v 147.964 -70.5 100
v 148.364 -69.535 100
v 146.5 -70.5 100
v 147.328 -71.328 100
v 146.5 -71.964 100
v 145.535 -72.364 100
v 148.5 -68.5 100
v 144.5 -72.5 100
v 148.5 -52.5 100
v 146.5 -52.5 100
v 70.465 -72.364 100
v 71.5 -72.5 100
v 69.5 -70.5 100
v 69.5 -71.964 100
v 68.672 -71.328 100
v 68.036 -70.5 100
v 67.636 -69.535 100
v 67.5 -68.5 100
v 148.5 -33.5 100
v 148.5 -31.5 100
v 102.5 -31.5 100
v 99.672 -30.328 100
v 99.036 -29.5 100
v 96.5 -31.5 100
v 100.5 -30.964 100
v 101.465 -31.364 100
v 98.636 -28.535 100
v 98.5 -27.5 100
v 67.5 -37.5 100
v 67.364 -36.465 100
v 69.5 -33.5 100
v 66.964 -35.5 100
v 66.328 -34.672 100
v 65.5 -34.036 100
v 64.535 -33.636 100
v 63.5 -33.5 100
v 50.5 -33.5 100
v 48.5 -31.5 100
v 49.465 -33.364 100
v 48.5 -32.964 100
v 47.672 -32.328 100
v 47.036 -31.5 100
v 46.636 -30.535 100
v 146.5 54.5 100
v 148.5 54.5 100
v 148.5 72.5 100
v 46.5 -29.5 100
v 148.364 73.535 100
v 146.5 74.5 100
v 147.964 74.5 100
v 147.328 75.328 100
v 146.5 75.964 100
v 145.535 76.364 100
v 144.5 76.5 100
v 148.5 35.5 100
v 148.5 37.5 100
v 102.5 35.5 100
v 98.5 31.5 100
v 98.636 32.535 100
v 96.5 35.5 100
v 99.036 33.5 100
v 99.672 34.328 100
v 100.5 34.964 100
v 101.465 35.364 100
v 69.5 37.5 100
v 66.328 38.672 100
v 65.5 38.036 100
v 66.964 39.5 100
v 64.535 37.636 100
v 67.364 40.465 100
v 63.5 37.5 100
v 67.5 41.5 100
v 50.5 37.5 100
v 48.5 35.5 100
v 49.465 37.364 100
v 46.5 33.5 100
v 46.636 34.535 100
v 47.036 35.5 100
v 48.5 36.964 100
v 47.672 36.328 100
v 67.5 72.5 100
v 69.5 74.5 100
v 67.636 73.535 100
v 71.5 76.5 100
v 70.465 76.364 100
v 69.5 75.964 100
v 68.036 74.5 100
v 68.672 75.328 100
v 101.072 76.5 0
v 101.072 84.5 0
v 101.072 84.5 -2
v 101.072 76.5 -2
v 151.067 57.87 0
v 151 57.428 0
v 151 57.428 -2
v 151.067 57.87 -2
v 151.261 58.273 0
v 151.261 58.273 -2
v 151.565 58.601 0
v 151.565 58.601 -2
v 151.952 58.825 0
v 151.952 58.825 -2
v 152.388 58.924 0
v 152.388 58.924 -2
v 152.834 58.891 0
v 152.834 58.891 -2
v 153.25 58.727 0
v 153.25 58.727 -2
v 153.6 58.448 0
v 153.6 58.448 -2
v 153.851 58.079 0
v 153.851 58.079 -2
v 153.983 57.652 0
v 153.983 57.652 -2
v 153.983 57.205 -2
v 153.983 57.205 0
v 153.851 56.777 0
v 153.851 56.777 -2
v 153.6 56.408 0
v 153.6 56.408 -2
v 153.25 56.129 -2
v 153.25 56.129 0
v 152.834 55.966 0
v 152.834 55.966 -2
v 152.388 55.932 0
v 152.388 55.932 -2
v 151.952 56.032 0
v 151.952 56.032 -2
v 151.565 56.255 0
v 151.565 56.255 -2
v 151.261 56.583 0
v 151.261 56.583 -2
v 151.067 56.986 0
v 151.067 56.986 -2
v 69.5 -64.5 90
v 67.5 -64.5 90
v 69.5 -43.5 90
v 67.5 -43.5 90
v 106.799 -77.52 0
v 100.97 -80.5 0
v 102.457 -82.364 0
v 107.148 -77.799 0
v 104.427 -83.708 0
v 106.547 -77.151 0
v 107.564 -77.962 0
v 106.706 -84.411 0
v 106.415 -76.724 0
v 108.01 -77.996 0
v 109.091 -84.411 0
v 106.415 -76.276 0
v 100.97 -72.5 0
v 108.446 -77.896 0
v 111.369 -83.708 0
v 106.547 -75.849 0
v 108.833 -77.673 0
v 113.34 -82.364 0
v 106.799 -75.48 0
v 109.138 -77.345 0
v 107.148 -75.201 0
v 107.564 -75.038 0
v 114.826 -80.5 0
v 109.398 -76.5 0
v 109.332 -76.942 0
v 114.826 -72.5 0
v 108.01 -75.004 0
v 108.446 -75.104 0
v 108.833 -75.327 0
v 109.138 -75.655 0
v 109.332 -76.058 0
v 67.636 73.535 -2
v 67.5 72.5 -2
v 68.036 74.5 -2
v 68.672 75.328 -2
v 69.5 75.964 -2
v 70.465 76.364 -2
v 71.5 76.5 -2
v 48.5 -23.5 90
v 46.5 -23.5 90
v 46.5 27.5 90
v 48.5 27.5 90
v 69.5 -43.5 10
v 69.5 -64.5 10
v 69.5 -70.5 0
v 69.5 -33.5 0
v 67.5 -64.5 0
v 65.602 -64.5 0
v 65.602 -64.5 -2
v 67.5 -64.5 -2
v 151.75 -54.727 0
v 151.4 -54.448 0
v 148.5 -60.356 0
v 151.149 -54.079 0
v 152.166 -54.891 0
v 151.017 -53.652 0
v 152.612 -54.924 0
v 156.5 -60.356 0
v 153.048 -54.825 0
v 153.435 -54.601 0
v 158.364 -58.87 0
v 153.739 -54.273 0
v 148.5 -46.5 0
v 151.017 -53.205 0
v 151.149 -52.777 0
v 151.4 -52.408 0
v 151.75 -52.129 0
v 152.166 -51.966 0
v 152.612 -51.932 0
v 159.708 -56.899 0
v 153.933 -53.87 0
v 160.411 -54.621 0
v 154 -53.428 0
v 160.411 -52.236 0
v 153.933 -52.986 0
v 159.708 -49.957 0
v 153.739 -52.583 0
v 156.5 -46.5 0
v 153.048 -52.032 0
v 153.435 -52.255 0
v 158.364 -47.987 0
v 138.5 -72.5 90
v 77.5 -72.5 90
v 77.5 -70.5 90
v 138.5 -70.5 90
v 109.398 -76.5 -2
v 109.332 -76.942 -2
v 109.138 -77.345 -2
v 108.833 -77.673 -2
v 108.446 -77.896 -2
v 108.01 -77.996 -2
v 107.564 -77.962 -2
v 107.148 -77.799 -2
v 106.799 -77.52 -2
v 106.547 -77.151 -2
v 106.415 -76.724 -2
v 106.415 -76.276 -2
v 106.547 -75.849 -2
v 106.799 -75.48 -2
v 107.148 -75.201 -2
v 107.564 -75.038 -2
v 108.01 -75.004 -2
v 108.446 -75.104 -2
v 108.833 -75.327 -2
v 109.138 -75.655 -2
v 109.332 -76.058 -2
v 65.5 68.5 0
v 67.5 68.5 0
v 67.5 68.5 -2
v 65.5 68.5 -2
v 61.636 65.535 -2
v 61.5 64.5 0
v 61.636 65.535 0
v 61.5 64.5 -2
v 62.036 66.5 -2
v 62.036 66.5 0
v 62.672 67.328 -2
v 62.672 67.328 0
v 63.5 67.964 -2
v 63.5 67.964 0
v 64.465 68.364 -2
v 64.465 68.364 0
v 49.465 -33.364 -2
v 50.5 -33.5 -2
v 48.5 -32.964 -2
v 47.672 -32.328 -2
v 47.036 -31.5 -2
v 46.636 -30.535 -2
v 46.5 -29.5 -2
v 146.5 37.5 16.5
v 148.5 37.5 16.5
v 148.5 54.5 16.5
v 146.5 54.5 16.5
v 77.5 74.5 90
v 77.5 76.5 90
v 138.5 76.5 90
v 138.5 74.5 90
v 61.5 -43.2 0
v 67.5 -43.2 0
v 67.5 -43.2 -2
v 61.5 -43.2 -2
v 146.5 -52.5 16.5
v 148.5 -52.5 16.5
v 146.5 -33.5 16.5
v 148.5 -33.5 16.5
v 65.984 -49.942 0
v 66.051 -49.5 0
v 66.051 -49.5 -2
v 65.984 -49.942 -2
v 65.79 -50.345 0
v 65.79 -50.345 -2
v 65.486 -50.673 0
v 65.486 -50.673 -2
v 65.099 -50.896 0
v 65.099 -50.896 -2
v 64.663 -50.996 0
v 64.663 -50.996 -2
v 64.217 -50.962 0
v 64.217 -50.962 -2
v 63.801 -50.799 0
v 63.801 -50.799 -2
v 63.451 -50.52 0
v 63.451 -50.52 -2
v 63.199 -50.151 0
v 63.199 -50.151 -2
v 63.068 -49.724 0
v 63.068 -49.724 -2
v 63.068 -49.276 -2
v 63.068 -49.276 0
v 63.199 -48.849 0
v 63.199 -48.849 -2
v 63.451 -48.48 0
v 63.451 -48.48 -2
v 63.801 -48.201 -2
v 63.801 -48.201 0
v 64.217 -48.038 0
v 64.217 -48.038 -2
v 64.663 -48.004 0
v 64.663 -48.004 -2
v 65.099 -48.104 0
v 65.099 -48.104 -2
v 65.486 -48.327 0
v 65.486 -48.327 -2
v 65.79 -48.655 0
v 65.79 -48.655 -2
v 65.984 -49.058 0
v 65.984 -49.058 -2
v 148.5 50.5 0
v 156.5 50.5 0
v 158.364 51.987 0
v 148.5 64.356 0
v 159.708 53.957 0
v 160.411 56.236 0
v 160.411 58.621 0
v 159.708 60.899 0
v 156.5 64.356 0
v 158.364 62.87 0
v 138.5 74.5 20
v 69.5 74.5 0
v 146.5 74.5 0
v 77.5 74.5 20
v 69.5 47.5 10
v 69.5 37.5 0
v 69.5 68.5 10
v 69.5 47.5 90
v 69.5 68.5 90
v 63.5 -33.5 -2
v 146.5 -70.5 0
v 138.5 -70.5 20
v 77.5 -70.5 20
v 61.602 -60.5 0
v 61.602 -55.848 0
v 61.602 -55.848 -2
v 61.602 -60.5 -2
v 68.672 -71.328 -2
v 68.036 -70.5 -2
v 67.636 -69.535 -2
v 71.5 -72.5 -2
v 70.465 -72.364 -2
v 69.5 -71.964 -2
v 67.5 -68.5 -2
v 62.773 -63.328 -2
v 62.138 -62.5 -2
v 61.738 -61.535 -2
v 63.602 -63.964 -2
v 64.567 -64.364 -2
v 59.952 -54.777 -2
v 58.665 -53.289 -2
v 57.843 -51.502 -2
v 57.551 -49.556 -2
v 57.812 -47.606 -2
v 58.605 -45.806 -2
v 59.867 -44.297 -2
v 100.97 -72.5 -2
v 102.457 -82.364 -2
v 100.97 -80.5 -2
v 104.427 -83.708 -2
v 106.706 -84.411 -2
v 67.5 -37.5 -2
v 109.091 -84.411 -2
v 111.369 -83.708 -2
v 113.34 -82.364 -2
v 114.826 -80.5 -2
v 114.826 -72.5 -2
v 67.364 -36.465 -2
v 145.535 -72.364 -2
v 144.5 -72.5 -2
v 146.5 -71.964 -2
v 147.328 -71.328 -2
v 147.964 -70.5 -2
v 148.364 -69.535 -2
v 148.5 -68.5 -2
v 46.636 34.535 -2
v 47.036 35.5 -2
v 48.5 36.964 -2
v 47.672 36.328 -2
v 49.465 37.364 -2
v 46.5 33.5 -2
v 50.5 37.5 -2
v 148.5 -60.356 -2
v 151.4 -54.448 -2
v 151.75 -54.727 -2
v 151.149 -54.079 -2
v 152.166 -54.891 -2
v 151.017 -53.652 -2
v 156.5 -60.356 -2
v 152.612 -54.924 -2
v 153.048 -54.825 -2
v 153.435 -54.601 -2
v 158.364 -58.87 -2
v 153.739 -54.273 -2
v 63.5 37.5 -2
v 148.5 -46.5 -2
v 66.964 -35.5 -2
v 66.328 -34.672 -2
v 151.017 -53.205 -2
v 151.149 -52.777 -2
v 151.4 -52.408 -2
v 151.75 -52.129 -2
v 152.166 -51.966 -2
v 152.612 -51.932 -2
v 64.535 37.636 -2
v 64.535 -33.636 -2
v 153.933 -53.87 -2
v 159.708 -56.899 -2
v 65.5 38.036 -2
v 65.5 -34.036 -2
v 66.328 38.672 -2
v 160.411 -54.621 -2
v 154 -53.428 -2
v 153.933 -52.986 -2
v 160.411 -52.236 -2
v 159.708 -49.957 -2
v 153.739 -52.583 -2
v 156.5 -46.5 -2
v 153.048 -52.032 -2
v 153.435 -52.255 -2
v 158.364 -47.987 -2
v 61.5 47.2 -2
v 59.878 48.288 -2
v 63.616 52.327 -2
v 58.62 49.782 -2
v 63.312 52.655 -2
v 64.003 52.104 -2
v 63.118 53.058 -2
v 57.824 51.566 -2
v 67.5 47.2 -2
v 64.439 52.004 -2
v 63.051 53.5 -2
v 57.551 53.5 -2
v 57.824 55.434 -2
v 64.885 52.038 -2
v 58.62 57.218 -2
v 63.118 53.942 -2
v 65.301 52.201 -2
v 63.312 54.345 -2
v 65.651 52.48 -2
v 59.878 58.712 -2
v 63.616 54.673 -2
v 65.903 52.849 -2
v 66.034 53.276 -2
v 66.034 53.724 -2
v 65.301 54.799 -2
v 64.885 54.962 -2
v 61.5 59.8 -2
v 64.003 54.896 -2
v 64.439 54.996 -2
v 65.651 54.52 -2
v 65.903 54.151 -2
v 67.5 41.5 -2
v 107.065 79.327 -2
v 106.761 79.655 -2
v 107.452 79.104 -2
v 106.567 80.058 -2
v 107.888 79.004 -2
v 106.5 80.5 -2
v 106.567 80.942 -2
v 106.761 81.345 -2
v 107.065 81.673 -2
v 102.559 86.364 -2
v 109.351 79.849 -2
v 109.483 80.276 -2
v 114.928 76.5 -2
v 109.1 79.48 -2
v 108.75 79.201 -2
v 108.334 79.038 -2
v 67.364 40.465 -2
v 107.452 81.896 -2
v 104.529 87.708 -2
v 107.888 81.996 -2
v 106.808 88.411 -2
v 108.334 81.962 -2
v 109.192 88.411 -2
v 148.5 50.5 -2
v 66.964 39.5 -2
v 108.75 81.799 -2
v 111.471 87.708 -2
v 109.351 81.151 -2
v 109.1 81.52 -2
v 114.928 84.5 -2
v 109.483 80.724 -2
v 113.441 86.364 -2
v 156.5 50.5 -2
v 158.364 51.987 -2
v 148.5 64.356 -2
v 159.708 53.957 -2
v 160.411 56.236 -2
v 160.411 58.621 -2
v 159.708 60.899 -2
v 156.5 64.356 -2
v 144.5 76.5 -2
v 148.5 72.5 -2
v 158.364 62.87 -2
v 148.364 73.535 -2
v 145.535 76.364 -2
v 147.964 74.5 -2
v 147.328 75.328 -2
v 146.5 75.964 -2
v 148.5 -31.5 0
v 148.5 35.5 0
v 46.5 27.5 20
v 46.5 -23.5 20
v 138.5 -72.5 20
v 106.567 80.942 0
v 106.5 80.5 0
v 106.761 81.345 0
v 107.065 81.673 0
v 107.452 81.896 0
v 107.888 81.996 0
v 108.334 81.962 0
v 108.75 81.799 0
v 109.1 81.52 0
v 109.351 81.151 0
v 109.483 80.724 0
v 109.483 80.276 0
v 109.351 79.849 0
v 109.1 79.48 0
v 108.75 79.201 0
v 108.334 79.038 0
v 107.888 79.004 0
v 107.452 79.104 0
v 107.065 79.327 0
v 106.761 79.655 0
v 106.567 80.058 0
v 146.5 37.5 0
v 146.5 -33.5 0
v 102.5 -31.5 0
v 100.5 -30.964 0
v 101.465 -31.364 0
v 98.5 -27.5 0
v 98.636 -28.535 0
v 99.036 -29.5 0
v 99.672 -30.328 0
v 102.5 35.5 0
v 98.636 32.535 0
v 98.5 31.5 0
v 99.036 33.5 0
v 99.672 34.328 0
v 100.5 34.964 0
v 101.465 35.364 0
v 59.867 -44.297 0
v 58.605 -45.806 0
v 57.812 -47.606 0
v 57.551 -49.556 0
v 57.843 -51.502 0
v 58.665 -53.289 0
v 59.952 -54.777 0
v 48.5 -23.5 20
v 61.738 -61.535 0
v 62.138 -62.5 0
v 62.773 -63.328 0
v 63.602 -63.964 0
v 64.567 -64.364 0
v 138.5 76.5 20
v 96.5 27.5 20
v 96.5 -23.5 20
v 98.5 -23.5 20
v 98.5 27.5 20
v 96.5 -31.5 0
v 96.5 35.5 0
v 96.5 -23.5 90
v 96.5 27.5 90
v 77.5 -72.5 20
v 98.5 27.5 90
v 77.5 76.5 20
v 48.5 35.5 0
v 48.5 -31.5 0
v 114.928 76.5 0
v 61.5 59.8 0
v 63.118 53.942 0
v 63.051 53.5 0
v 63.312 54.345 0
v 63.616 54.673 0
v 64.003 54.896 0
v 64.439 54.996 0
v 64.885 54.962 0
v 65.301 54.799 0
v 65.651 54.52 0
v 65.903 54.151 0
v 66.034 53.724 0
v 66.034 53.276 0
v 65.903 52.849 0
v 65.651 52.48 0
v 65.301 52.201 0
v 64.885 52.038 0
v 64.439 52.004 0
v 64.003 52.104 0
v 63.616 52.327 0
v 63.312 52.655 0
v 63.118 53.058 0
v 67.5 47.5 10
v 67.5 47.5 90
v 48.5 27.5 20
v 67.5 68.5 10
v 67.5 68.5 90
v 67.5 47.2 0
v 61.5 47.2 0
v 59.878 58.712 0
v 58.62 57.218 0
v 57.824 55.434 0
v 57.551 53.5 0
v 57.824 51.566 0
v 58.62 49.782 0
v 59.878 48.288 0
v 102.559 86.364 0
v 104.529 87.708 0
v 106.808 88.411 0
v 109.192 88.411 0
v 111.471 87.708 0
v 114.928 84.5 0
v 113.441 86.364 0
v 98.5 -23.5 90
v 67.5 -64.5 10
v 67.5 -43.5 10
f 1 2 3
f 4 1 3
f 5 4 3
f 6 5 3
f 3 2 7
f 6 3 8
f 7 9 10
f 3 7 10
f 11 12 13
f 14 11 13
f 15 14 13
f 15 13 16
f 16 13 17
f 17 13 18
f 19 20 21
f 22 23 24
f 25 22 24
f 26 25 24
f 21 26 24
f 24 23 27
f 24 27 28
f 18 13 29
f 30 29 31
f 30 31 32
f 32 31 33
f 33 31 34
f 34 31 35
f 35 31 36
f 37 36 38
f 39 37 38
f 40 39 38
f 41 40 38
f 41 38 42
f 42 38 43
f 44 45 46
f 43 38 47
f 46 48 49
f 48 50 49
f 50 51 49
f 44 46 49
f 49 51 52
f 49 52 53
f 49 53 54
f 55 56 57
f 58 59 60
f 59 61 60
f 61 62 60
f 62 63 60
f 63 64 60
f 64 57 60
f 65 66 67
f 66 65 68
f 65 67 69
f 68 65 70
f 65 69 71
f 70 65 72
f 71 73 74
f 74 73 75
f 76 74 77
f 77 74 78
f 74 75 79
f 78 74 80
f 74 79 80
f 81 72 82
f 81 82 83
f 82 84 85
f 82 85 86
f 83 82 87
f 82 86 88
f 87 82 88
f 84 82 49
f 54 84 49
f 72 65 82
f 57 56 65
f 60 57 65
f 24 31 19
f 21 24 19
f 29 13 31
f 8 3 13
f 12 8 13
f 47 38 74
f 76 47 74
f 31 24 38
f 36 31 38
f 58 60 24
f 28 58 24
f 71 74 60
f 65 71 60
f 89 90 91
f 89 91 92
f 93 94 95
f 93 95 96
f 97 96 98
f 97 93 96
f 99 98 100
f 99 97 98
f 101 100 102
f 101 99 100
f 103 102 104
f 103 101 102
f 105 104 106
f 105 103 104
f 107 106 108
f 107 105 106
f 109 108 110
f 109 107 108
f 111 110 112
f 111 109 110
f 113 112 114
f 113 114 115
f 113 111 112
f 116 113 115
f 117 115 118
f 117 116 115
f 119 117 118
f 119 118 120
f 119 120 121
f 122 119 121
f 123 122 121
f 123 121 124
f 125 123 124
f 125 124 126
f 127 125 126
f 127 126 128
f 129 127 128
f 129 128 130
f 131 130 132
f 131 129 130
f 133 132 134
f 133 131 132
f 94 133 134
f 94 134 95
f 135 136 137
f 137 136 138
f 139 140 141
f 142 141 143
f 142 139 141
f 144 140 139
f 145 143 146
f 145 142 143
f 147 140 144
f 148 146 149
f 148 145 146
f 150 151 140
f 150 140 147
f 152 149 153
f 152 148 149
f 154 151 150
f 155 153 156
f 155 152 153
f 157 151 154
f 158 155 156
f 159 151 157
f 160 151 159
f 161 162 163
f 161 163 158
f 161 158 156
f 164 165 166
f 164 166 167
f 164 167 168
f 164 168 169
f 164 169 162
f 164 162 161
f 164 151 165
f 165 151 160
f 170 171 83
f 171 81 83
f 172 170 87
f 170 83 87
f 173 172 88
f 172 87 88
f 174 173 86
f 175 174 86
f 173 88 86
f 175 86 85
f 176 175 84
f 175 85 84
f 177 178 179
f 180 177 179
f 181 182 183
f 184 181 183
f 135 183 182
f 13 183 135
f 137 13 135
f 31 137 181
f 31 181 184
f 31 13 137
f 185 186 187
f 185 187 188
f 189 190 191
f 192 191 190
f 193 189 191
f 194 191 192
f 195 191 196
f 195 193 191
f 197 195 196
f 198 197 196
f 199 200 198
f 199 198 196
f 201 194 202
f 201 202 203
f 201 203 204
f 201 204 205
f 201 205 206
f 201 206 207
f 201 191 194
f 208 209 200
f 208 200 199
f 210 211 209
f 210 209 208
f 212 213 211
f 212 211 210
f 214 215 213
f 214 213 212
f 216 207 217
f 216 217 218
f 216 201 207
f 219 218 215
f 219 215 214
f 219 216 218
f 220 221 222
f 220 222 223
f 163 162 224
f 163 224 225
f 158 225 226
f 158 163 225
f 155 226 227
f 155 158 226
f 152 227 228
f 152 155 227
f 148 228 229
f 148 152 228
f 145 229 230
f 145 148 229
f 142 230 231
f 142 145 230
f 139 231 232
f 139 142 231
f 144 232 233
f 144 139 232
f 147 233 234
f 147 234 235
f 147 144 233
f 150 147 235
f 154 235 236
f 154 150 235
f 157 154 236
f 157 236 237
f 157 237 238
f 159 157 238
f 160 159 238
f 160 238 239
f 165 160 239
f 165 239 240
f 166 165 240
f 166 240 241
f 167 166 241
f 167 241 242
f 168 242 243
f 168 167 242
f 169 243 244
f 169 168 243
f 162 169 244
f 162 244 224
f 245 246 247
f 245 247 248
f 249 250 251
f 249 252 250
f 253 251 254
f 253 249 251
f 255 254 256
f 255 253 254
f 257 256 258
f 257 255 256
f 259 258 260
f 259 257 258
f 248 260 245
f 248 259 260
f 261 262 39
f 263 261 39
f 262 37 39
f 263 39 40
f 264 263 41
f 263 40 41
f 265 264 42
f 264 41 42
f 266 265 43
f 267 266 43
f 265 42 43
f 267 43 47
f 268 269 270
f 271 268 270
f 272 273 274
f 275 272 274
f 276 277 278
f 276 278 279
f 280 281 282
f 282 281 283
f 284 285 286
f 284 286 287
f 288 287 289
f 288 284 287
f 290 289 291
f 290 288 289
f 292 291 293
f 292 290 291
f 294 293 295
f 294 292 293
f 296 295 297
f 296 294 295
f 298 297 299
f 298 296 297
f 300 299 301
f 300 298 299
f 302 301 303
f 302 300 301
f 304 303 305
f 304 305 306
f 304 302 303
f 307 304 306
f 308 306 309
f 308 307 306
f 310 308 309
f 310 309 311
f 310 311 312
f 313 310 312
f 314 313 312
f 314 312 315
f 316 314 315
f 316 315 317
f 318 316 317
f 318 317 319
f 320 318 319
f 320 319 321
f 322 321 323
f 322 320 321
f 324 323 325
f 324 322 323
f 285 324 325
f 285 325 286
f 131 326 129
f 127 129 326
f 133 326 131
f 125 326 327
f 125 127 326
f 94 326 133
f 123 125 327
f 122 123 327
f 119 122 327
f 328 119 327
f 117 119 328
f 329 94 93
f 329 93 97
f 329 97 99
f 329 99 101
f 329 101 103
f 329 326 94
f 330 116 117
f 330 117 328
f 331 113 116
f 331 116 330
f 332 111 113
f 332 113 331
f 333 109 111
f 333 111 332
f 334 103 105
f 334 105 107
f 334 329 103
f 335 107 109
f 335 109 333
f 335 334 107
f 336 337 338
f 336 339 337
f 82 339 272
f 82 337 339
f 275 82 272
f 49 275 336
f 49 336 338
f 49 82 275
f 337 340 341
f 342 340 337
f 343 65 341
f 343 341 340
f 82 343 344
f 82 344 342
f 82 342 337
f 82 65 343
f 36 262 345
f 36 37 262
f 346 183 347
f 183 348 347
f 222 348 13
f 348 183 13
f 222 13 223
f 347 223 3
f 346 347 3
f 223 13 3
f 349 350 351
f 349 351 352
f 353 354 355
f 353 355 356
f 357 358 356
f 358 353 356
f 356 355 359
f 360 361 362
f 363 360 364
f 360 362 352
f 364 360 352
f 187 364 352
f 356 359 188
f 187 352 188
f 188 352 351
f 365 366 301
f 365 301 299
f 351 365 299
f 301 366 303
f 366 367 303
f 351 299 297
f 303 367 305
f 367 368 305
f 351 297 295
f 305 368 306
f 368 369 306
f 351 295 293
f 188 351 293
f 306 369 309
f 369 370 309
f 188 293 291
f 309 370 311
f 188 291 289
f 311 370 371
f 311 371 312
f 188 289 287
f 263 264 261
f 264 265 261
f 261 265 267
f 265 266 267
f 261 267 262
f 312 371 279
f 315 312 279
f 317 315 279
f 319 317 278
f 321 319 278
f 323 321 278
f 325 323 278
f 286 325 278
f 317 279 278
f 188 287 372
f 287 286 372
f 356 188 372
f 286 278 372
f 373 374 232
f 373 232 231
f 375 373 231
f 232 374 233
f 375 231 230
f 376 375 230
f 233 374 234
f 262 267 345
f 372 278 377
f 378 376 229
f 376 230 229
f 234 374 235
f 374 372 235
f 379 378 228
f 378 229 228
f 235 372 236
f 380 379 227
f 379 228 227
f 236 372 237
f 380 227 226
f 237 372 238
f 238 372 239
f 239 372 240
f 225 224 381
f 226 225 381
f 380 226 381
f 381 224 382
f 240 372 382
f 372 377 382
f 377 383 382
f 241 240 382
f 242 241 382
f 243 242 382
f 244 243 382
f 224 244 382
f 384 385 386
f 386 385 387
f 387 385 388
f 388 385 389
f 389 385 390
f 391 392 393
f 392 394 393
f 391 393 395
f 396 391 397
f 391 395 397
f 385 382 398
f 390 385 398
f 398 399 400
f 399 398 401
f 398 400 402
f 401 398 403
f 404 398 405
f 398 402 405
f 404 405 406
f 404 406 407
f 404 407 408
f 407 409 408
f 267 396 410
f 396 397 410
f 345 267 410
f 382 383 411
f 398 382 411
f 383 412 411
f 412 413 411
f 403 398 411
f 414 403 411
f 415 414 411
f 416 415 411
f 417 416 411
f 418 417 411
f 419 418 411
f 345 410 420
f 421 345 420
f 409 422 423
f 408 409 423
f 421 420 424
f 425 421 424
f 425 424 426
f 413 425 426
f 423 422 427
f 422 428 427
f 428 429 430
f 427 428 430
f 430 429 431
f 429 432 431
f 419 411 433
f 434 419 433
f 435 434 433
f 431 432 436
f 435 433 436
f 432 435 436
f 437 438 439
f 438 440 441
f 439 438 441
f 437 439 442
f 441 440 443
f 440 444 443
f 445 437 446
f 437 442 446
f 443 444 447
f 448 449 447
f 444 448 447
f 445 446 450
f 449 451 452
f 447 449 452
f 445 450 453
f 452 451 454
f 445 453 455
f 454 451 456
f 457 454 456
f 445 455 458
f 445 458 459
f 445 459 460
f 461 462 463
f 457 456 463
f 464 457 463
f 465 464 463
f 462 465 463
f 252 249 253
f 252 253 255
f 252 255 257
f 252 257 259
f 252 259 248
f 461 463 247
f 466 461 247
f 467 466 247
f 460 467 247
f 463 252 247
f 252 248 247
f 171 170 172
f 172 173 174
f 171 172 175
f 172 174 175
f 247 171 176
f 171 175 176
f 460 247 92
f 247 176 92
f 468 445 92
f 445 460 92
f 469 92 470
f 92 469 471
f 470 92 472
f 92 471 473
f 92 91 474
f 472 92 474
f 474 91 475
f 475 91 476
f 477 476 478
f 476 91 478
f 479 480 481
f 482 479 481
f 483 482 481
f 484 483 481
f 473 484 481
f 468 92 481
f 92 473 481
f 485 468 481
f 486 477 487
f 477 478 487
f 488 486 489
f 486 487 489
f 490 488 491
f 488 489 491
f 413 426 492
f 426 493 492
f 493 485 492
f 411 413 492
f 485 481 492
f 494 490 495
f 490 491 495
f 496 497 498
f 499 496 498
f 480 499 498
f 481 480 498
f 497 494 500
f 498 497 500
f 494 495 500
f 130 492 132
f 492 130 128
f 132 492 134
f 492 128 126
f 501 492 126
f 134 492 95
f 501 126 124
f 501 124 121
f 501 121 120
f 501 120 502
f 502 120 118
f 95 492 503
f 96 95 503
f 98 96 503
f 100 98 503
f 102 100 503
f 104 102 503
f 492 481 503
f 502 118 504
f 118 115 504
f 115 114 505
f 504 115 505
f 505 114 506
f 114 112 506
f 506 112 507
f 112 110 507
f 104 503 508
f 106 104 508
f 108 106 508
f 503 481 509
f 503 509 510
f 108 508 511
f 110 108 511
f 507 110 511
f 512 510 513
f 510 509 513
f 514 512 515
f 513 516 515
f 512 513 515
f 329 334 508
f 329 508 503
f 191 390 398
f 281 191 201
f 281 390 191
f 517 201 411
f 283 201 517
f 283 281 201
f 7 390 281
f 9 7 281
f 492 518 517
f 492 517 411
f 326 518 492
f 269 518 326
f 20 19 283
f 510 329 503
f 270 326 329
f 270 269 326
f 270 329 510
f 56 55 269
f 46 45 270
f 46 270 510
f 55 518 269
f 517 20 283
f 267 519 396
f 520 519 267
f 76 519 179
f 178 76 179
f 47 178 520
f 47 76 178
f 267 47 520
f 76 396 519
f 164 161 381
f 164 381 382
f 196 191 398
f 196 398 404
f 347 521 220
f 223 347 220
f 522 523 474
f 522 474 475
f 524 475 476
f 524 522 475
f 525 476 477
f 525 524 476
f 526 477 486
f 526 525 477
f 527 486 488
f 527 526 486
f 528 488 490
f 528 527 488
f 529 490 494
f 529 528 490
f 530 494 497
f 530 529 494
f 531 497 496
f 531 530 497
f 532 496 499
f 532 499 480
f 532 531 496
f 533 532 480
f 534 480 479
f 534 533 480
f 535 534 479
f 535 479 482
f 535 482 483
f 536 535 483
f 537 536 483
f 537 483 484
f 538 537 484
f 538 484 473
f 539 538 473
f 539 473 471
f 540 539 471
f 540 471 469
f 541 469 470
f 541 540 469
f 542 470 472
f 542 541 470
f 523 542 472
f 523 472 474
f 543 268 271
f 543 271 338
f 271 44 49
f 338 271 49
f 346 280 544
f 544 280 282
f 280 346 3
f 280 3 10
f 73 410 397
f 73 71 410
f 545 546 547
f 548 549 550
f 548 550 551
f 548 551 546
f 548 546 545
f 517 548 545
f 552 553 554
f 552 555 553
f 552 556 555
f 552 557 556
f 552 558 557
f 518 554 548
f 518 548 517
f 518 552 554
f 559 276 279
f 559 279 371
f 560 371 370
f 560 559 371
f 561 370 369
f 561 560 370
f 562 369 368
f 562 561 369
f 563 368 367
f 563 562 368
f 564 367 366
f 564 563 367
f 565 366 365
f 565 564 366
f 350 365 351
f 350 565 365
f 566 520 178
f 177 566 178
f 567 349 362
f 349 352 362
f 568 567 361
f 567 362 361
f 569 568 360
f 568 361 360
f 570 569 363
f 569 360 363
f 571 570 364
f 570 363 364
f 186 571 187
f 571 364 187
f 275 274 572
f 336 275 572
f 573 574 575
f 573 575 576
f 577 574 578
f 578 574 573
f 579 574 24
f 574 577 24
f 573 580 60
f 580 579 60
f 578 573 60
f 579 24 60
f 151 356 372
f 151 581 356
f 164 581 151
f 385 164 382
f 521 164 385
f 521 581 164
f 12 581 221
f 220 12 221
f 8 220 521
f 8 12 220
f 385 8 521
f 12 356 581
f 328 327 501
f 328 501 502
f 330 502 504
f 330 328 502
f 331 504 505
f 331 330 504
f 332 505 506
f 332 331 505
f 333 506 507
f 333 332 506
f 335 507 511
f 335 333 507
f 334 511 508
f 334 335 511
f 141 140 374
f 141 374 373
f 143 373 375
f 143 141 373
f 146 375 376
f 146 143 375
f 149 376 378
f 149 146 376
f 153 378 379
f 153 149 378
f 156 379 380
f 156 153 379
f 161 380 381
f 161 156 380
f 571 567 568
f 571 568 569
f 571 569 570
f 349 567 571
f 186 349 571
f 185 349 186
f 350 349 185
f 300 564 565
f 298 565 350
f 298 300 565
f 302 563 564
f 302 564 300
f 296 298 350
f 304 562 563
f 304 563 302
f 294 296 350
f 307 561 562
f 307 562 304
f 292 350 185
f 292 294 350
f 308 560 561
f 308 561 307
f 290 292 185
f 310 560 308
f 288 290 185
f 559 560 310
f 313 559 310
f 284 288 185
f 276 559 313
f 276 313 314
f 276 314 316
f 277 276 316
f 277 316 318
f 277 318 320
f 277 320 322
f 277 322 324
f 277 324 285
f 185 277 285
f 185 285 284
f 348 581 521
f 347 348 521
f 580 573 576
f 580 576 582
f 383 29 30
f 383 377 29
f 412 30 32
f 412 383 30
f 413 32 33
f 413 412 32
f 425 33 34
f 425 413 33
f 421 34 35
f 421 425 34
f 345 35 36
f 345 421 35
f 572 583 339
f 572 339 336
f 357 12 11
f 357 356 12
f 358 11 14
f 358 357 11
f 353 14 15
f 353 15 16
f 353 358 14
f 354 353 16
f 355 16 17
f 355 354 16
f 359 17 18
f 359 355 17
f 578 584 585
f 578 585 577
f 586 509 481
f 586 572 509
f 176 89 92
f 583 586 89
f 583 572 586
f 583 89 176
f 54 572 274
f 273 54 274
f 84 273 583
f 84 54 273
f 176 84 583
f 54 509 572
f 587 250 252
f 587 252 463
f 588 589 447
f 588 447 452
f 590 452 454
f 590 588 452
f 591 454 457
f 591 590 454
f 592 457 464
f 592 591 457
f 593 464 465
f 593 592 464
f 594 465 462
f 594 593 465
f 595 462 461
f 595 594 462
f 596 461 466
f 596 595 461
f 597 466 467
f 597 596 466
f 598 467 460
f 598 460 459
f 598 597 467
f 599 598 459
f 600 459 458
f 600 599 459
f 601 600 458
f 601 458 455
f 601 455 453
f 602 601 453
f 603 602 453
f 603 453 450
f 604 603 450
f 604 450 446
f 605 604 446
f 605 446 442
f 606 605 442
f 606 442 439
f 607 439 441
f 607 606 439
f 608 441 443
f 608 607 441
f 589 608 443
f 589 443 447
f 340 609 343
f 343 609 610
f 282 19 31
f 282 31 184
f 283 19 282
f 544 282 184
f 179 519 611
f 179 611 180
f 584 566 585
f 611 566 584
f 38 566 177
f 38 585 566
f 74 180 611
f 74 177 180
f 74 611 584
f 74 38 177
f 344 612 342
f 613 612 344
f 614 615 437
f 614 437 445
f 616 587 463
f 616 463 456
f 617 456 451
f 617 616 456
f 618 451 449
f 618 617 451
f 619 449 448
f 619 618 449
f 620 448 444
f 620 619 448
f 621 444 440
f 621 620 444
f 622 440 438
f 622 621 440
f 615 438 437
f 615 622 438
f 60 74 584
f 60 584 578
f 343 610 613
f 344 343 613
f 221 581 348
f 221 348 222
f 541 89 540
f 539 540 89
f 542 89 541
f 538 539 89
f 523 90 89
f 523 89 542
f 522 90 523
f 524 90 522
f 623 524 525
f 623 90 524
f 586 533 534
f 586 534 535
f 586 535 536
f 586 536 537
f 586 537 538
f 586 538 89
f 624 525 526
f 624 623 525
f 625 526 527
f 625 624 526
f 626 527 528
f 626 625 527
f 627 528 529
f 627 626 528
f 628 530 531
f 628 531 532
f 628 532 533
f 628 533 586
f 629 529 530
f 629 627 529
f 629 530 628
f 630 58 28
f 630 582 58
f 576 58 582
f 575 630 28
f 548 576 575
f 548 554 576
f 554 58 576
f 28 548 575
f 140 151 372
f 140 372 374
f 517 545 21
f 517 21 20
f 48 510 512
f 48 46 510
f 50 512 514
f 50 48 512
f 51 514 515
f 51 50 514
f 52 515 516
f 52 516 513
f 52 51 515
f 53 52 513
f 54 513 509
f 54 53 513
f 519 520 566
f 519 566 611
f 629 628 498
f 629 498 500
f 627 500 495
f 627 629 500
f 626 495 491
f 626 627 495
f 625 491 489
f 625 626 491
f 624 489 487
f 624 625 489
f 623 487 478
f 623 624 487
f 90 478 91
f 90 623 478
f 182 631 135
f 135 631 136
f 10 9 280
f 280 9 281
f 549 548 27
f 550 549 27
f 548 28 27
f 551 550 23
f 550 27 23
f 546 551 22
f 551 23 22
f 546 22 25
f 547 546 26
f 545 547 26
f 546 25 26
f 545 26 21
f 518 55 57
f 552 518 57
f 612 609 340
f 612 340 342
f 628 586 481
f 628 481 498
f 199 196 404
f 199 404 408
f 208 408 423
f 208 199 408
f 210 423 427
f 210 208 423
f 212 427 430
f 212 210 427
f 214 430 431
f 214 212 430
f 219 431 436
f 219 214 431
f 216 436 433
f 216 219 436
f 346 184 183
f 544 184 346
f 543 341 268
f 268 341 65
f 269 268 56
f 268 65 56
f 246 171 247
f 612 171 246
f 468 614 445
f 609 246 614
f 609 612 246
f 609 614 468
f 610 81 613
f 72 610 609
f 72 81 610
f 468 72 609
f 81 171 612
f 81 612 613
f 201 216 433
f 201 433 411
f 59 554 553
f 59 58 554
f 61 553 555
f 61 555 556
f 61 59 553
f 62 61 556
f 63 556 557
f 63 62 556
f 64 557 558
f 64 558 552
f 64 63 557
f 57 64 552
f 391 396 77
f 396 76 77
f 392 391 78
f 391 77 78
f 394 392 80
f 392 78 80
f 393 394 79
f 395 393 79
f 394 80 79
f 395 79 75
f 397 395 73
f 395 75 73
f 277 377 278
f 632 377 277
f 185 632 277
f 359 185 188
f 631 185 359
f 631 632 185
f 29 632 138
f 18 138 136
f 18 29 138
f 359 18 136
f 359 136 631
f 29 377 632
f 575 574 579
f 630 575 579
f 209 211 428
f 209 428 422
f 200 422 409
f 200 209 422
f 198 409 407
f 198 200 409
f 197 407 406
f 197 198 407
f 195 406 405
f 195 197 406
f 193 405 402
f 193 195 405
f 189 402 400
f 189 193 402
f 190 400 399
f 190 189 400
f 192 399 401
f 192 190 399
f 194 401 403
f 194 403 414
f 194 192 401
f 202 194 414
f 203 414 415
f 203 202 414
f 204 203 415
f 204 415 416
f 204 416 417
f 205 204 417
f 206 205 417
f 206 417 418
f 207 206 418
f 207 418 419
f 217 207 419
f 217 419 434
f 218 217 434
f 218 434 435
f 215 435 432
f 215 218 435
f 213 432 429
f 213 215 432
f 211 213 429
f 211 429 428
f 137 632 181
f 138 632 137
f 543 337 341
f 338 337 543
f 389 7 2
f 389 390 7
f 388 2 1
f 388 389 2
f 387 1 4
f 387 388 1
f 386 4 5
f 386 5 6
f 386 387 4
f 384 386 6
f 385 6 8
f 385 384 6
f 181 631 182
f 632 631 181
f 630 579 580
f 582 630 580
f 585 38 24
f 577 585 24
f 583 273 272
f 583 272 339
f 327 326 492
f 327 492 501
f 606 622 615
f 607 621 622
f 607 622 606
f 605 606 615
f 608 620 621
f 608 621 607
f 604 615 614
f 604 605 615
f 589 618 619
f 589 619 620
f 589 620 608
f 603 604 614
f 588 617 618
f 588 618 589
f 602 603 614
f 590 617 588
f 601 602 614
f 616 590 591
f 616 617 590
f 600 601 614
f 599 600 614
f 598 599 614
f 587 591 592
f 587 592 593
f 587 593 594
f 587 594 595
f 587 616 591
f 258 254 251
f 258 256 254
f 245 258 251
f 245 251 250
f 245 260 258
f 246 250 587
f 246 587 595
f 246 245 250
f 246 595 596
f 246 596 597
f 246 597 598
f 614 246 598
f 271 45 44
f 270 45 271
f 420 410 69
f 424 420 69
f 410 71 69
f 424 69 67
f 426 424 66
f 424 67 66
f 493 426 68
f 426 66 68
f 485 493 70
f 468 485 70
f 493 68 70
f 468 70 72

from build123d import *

# Parameters (mm, degrees)
BOSS_EXTRU_9_DEPTH       = 100
ESQUISSE31_W             = 77
ESQUISSE31_H             = 37
ESQUISSE31_W_2           = 48
ESQUISSE31_H_2           = 67
ENL_V_MAT_EXTRU_17_DEPTH = 100
ESQUISSE35_W             = 61
ESQUISSE35_H             = 70
ENL_V_MAT_EXTRU_20_DEPTH = 2
ESQUISSE37_W             = 70
ESQUISSE37_H             = 51
ENL_V_MAT_EXTRU_22_DEPTH = 52
ESQUISSE38_W             = 61
ESQUISSE38_H             = 70
ENL_V_MAT_EXTRU_23_DEPTH = 2
ESQUISSE36_W             = 80
ESQUISSE36_H             = 21
ENL_V_MAT_EXTRU_25_DEPTH = 2
ESQUISSE39_W             = 83.5
ESQUISSE39_H             = 17
ESQUISSE39_H_2           = 19
ENL_V_MAT_EXTRU_26_DEPTH = 2
ESQUISSE46_R             = 1.5
BOSS_EXTRU_10_DEPTH      = 2
CONG_59_R                = 4


with BuildPart() as part:
    # Esquisse27 → Boss.-Extru.9 (new body)
    with BuildSketch(Plane.XY):
        Polygon((148.5, -72.5), (67.5, -72.5), (67.5, -33.5), (46.5, -33.5), (46.5, 37.5), (67.5, 37.5), (67.5, 76.5), (148.5, 76.5), (148.5, 35.5), (98.5, 35.5), (98.5, -31.5), (148.5, -31.5), align=None)
    extrude(amount=BOSS_EXTRU_9_DEPTH)

    # Esquisse31 → Enlèv. mat.-Extru.17 (cut)
    with BuildSketch(Plane.XY.offset(100)):
        with Locations((108, 56)):
            Rectangle(ESQUISSE31_W, ESQUISSE31_H)
        with Locations((72.5, 2)):
            Rectangle(ESQUISSE31_W_2, ESQUISSE31_H_2)
        with Locations((108, -52)):
            Rectangle(ESQUISSE31_W, ESQUISSE31_H)
    extrude(amount=-ENL_V_MAT_EXTRU_17_DEPTH, mode=Mode.SUBTRACT)

    # Esquisse35 → Enlèv. mat.-Extru.20 (cut)
    with BuildSketch(Plane.XZ.offset(72.5)):
        with Locations((108, 55)):
            Rectangle(ESQUISSE35_W, ESQUISSE35_H)
    extrude(amount=-ENL_V_MAT_EXTRU_20_DEPTH, mode=Mode.SUBTRACT)

    # Esquisse37 → Enlèv. mat.-Extru.22 (cut)
    with BuildSketch(Plane.ZY.offset(-46.5)):
        with Locations((55, 2)):
            Rectangle(ESQUISSE37_W, ESQUISSE37_H)
    extrude(amount=-ENL_V_MAT_EXTRU_22_DEPTH, mode=Mode.SUBTRACT)

    # Esquisse38 → Enlèv. mat.-Extru.23 (cut)
    with BuildSketch(Plane(origin=(0, 76.5, 0), x_dir=(1, 0, 0), z_dir=(0, 1, 0))):
        with Locations((108, -55)):
            Rectangle(ESQUISSE38_W, ESQUISSE38_H)
    extrude(amount=-ENL_V_MAT_EXTRU_23_DEPTH, mode=Mode.SUBTRACT)

    # Esquisse36 → Enlèv. mat.-Extru.25 (cut)
    with BuildSketch(Plane.ZY.offset(-67.5)):
        with Locations((50, 58)):
            Rectangle(ESQUISSE36_W, ESQUISSE36_H)
        with Locations((50, -54)):
            Rectangle(ESQUISSE36_W, ESQUISSE36_H)
    extrude(amount=-ENL_V_MAT_EXTRU_25_DEPTH, mode=Mode.SUBTRACT)

    # Esquisse39 → Enlèv. mat.-Extru.26 (cut)
    with BuildSketch(Plane(origin=(148.5, 0, 0), x_dir=(0, 0, -1), z_dir=(1, 0, 0))):
        with Locations((-58.25, 46)):
            Rectangle(ESQUISSE39_W, ESQUISSE39_H)
        with Locations((-58.25, -43)):
            Rectangle(ESQUISSE39_W, ESQUISSE39_H_2)
    extrude(amount=-ENL_V_MAT_EXTRU_26_DEPTH, mode=Mode.SUBTRACT)

    # Esquisse46 → Boss.-Extru.10 (add)
    with BuildSketch(Plane(origin=(0, 0, 0), x_dir=(-1, 0, 0), z_dir=(0, 0, -1))):
        with BuildLine():
            Line((-148.5, 64.356406461), (-148.5, 76.5))
            Line((-148.5, 76.5), (-114.92820323, 76.5))
            Line((-114.92820323, 76.5), (-114.92820323, 84.5))
            ThreePointArc((-114.92820323, 84.5), (-108, 88.5), (-101.07179677, 84.5))
            Line((-101.07179677, 84.5), (-101.07179677, 76.5))
            Line((-101.07179677, 76.5), (-67.5, 76.5))
            Line((-67.5, 76.5), (-67.5, 68.5))
            Line((-67.5, 68.5), (-61.5, 68.5))
            Line((-61.5, 68.5), (-61.5, 59.8))
            ThreePointArc((-61.5, 59.8), (-57.55122926, 53.5), (-61.5, 47.2))
            Line((-61.5, 47.2), (-67.5, 47.2))
            Line((-67.5, 47.2), (-67.5, 37.5))
            Line((-67.5, 37.5), (-46.5, 37.5))
            Line((-46.5, 37.5), (-46.5, -33.5))
            Line((-46.5, -33.5), (-67.5, -33.5))
            Line((-67.5, -33.5), (-67.5, -43.199792715))
            Line((-67.5, -43.199792715), (-61.5, -43.199792715))
            ThreePointArc((-61.5, -43.199792715), (-57.551027919, -49.556334189), (-61.60179677, -55.848493732))
            Line((-61.60179677, -55.848493732), (-61.60179677, -64.5))
            Line((-61.60179677, -64.5), (-67.5, -64.5))
            Line((-67.5, -64.5), (-67.5, -72.5))
            Line((-67.5, -72.5), (-100.97, -72.5))
            Line((-100.97, -72.5), (-100.97, -80.5))
            ThreePointArc((-100.97, -80.5), (-107.89820323, -84.5), (-114.826406461, -80.5))
            Line((-114.826406461, -80.5), (-114.826406461, -72.5))
            Line((-114.826406461, -72.5), (-148.5, -72.5))
            Line((-148.5, -72.5), (-148.5, -60.356406461))
            Line((-148.5, -60.356406461), (-156.5, -60.356406461))
            ThreePointArc((-156.5, -60.356406461), (-160.5, -53.42820323), (-156.5, -46.5))
            Line((-156.5, -46.5), (-148.5, -46.5))
            Line((-148.5, -46.5), (-148.5, 50.5))
            Line((-148.5, 50.5), (-156.5, 50.5))
            ThreePointArc((-156.5, 50.5), (-160.5, 57.42820323), (-156.5, 64.356406461))
            Line((-156.5, 64.356406461), (-148.5, 64.356406461))
        make_face()
        with Locations((-108, 80.5)):
            Circle(ESQUISSE46_R, mode=Mode.SUBTRACT)
        with Locations((-152.5, 57.42820323)):
            Circle(ESQUISSE46_R, mode=Mode.SUBTRACT)
        with Locations((-64.55122926, 53.5)):
            Circle(ESQUISSE46_R, mode=Mode.SUBTRACT)
        with Locations(Location((-64.550801234, -49.5, 0), (0, 0, 180))):
            Circle(ESQUISSE46_R, mode=Mode.SUBTRACT)
        with Locations(Location((-152.5, -53.42820323, 0), (0, 0, 180))):
            Circle(ESQUISSE46_R, mode=Mode.SUBTRACT)
        with Locations(Location((-107.89820323, -76.5, 0), (0, 0, 180))):
            Circle(ESQUISSE46_R, mode=Mode.SUBTRACT)
    extrude(amount=BOSS_EXTRU_10_DEPTH)

    # Congé59
    cong_59_edges = [part.edges().sort_by_distance(p)[0] for p in [
        (98.5, 35.5, 50),
        (98.5, -31.5, 50),
        (148.5, -72.5, 49),
        (67.5, -72.5, 49),
        (67.5, -33.5, 49),
        (46.5, -33.5, 49),
        (46.5, 37.5, 49),
        (67.5, 37.5, 49),
        (67.5, 76.5, 49),
        (148.5, 76.5, 49),
        (61.5, 68.5, -1),
        (61.60179677, -64.5, -1),
    ]]
    fillet(cong_59_edges, radius=CONG_59_R)


solid = part.part
